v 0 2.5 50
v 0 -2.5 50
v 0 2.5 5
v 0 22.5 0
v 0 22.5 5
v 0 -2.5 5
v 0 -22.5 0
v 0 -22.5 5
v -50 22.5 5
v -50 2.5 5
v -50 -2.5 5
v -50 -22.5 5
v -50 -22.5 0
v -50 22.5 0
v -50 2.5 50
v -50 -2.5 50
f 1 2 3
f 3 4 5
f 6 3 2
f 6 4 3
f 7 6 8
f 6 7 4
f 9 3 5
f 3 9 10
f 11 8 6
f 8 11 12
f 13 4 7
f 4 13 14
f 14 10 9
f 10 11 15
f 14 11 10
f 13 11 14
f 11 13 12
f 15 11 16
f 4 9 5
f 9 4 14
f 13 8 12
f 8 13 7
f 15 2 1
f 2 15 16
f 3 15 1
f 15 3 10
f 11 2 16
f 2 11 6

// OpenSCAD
// Built by bench/smallmodels/features/compiler.py from a list of features.
$fn = 64;
difference() {
  union() {
    translate([-25, 0, 0]) translate([-25, -22.5, 0]) cube([50, 45, 5]);
    translate([-25, 0, 0]) translate([-25, -2.5, 0]) cube([50, 5, 50]);
  }
  union() {
    translate([-17, 30, 3.75]) rotate([0, 0, 0]) rotate([0, 90, 0]) cylinder(d = 4.5, h = 1200, center = true);
    translate([17, 30, 3.75]) rotate([0, 0, 0]) rotate([0, 90, 0]) cylinder(d = 4.5, h = 1200, center = true);
  }
}
difference() {
  union() {
    translate([-25, 0, 0]) translate([-25, -2.5, 0]) cube([50, 5, 50]);
  }
  union() {
    translate([0, 2.5, -1]) rotate([0, 0, 0]) cylinder(d = 23, h = 52);
    translate([0, 2.5, 28]) rotate([0, 0, 0]) translate([-1.7, -15.5, 0]) cube([3.4, 31, 31]);
  }
}
